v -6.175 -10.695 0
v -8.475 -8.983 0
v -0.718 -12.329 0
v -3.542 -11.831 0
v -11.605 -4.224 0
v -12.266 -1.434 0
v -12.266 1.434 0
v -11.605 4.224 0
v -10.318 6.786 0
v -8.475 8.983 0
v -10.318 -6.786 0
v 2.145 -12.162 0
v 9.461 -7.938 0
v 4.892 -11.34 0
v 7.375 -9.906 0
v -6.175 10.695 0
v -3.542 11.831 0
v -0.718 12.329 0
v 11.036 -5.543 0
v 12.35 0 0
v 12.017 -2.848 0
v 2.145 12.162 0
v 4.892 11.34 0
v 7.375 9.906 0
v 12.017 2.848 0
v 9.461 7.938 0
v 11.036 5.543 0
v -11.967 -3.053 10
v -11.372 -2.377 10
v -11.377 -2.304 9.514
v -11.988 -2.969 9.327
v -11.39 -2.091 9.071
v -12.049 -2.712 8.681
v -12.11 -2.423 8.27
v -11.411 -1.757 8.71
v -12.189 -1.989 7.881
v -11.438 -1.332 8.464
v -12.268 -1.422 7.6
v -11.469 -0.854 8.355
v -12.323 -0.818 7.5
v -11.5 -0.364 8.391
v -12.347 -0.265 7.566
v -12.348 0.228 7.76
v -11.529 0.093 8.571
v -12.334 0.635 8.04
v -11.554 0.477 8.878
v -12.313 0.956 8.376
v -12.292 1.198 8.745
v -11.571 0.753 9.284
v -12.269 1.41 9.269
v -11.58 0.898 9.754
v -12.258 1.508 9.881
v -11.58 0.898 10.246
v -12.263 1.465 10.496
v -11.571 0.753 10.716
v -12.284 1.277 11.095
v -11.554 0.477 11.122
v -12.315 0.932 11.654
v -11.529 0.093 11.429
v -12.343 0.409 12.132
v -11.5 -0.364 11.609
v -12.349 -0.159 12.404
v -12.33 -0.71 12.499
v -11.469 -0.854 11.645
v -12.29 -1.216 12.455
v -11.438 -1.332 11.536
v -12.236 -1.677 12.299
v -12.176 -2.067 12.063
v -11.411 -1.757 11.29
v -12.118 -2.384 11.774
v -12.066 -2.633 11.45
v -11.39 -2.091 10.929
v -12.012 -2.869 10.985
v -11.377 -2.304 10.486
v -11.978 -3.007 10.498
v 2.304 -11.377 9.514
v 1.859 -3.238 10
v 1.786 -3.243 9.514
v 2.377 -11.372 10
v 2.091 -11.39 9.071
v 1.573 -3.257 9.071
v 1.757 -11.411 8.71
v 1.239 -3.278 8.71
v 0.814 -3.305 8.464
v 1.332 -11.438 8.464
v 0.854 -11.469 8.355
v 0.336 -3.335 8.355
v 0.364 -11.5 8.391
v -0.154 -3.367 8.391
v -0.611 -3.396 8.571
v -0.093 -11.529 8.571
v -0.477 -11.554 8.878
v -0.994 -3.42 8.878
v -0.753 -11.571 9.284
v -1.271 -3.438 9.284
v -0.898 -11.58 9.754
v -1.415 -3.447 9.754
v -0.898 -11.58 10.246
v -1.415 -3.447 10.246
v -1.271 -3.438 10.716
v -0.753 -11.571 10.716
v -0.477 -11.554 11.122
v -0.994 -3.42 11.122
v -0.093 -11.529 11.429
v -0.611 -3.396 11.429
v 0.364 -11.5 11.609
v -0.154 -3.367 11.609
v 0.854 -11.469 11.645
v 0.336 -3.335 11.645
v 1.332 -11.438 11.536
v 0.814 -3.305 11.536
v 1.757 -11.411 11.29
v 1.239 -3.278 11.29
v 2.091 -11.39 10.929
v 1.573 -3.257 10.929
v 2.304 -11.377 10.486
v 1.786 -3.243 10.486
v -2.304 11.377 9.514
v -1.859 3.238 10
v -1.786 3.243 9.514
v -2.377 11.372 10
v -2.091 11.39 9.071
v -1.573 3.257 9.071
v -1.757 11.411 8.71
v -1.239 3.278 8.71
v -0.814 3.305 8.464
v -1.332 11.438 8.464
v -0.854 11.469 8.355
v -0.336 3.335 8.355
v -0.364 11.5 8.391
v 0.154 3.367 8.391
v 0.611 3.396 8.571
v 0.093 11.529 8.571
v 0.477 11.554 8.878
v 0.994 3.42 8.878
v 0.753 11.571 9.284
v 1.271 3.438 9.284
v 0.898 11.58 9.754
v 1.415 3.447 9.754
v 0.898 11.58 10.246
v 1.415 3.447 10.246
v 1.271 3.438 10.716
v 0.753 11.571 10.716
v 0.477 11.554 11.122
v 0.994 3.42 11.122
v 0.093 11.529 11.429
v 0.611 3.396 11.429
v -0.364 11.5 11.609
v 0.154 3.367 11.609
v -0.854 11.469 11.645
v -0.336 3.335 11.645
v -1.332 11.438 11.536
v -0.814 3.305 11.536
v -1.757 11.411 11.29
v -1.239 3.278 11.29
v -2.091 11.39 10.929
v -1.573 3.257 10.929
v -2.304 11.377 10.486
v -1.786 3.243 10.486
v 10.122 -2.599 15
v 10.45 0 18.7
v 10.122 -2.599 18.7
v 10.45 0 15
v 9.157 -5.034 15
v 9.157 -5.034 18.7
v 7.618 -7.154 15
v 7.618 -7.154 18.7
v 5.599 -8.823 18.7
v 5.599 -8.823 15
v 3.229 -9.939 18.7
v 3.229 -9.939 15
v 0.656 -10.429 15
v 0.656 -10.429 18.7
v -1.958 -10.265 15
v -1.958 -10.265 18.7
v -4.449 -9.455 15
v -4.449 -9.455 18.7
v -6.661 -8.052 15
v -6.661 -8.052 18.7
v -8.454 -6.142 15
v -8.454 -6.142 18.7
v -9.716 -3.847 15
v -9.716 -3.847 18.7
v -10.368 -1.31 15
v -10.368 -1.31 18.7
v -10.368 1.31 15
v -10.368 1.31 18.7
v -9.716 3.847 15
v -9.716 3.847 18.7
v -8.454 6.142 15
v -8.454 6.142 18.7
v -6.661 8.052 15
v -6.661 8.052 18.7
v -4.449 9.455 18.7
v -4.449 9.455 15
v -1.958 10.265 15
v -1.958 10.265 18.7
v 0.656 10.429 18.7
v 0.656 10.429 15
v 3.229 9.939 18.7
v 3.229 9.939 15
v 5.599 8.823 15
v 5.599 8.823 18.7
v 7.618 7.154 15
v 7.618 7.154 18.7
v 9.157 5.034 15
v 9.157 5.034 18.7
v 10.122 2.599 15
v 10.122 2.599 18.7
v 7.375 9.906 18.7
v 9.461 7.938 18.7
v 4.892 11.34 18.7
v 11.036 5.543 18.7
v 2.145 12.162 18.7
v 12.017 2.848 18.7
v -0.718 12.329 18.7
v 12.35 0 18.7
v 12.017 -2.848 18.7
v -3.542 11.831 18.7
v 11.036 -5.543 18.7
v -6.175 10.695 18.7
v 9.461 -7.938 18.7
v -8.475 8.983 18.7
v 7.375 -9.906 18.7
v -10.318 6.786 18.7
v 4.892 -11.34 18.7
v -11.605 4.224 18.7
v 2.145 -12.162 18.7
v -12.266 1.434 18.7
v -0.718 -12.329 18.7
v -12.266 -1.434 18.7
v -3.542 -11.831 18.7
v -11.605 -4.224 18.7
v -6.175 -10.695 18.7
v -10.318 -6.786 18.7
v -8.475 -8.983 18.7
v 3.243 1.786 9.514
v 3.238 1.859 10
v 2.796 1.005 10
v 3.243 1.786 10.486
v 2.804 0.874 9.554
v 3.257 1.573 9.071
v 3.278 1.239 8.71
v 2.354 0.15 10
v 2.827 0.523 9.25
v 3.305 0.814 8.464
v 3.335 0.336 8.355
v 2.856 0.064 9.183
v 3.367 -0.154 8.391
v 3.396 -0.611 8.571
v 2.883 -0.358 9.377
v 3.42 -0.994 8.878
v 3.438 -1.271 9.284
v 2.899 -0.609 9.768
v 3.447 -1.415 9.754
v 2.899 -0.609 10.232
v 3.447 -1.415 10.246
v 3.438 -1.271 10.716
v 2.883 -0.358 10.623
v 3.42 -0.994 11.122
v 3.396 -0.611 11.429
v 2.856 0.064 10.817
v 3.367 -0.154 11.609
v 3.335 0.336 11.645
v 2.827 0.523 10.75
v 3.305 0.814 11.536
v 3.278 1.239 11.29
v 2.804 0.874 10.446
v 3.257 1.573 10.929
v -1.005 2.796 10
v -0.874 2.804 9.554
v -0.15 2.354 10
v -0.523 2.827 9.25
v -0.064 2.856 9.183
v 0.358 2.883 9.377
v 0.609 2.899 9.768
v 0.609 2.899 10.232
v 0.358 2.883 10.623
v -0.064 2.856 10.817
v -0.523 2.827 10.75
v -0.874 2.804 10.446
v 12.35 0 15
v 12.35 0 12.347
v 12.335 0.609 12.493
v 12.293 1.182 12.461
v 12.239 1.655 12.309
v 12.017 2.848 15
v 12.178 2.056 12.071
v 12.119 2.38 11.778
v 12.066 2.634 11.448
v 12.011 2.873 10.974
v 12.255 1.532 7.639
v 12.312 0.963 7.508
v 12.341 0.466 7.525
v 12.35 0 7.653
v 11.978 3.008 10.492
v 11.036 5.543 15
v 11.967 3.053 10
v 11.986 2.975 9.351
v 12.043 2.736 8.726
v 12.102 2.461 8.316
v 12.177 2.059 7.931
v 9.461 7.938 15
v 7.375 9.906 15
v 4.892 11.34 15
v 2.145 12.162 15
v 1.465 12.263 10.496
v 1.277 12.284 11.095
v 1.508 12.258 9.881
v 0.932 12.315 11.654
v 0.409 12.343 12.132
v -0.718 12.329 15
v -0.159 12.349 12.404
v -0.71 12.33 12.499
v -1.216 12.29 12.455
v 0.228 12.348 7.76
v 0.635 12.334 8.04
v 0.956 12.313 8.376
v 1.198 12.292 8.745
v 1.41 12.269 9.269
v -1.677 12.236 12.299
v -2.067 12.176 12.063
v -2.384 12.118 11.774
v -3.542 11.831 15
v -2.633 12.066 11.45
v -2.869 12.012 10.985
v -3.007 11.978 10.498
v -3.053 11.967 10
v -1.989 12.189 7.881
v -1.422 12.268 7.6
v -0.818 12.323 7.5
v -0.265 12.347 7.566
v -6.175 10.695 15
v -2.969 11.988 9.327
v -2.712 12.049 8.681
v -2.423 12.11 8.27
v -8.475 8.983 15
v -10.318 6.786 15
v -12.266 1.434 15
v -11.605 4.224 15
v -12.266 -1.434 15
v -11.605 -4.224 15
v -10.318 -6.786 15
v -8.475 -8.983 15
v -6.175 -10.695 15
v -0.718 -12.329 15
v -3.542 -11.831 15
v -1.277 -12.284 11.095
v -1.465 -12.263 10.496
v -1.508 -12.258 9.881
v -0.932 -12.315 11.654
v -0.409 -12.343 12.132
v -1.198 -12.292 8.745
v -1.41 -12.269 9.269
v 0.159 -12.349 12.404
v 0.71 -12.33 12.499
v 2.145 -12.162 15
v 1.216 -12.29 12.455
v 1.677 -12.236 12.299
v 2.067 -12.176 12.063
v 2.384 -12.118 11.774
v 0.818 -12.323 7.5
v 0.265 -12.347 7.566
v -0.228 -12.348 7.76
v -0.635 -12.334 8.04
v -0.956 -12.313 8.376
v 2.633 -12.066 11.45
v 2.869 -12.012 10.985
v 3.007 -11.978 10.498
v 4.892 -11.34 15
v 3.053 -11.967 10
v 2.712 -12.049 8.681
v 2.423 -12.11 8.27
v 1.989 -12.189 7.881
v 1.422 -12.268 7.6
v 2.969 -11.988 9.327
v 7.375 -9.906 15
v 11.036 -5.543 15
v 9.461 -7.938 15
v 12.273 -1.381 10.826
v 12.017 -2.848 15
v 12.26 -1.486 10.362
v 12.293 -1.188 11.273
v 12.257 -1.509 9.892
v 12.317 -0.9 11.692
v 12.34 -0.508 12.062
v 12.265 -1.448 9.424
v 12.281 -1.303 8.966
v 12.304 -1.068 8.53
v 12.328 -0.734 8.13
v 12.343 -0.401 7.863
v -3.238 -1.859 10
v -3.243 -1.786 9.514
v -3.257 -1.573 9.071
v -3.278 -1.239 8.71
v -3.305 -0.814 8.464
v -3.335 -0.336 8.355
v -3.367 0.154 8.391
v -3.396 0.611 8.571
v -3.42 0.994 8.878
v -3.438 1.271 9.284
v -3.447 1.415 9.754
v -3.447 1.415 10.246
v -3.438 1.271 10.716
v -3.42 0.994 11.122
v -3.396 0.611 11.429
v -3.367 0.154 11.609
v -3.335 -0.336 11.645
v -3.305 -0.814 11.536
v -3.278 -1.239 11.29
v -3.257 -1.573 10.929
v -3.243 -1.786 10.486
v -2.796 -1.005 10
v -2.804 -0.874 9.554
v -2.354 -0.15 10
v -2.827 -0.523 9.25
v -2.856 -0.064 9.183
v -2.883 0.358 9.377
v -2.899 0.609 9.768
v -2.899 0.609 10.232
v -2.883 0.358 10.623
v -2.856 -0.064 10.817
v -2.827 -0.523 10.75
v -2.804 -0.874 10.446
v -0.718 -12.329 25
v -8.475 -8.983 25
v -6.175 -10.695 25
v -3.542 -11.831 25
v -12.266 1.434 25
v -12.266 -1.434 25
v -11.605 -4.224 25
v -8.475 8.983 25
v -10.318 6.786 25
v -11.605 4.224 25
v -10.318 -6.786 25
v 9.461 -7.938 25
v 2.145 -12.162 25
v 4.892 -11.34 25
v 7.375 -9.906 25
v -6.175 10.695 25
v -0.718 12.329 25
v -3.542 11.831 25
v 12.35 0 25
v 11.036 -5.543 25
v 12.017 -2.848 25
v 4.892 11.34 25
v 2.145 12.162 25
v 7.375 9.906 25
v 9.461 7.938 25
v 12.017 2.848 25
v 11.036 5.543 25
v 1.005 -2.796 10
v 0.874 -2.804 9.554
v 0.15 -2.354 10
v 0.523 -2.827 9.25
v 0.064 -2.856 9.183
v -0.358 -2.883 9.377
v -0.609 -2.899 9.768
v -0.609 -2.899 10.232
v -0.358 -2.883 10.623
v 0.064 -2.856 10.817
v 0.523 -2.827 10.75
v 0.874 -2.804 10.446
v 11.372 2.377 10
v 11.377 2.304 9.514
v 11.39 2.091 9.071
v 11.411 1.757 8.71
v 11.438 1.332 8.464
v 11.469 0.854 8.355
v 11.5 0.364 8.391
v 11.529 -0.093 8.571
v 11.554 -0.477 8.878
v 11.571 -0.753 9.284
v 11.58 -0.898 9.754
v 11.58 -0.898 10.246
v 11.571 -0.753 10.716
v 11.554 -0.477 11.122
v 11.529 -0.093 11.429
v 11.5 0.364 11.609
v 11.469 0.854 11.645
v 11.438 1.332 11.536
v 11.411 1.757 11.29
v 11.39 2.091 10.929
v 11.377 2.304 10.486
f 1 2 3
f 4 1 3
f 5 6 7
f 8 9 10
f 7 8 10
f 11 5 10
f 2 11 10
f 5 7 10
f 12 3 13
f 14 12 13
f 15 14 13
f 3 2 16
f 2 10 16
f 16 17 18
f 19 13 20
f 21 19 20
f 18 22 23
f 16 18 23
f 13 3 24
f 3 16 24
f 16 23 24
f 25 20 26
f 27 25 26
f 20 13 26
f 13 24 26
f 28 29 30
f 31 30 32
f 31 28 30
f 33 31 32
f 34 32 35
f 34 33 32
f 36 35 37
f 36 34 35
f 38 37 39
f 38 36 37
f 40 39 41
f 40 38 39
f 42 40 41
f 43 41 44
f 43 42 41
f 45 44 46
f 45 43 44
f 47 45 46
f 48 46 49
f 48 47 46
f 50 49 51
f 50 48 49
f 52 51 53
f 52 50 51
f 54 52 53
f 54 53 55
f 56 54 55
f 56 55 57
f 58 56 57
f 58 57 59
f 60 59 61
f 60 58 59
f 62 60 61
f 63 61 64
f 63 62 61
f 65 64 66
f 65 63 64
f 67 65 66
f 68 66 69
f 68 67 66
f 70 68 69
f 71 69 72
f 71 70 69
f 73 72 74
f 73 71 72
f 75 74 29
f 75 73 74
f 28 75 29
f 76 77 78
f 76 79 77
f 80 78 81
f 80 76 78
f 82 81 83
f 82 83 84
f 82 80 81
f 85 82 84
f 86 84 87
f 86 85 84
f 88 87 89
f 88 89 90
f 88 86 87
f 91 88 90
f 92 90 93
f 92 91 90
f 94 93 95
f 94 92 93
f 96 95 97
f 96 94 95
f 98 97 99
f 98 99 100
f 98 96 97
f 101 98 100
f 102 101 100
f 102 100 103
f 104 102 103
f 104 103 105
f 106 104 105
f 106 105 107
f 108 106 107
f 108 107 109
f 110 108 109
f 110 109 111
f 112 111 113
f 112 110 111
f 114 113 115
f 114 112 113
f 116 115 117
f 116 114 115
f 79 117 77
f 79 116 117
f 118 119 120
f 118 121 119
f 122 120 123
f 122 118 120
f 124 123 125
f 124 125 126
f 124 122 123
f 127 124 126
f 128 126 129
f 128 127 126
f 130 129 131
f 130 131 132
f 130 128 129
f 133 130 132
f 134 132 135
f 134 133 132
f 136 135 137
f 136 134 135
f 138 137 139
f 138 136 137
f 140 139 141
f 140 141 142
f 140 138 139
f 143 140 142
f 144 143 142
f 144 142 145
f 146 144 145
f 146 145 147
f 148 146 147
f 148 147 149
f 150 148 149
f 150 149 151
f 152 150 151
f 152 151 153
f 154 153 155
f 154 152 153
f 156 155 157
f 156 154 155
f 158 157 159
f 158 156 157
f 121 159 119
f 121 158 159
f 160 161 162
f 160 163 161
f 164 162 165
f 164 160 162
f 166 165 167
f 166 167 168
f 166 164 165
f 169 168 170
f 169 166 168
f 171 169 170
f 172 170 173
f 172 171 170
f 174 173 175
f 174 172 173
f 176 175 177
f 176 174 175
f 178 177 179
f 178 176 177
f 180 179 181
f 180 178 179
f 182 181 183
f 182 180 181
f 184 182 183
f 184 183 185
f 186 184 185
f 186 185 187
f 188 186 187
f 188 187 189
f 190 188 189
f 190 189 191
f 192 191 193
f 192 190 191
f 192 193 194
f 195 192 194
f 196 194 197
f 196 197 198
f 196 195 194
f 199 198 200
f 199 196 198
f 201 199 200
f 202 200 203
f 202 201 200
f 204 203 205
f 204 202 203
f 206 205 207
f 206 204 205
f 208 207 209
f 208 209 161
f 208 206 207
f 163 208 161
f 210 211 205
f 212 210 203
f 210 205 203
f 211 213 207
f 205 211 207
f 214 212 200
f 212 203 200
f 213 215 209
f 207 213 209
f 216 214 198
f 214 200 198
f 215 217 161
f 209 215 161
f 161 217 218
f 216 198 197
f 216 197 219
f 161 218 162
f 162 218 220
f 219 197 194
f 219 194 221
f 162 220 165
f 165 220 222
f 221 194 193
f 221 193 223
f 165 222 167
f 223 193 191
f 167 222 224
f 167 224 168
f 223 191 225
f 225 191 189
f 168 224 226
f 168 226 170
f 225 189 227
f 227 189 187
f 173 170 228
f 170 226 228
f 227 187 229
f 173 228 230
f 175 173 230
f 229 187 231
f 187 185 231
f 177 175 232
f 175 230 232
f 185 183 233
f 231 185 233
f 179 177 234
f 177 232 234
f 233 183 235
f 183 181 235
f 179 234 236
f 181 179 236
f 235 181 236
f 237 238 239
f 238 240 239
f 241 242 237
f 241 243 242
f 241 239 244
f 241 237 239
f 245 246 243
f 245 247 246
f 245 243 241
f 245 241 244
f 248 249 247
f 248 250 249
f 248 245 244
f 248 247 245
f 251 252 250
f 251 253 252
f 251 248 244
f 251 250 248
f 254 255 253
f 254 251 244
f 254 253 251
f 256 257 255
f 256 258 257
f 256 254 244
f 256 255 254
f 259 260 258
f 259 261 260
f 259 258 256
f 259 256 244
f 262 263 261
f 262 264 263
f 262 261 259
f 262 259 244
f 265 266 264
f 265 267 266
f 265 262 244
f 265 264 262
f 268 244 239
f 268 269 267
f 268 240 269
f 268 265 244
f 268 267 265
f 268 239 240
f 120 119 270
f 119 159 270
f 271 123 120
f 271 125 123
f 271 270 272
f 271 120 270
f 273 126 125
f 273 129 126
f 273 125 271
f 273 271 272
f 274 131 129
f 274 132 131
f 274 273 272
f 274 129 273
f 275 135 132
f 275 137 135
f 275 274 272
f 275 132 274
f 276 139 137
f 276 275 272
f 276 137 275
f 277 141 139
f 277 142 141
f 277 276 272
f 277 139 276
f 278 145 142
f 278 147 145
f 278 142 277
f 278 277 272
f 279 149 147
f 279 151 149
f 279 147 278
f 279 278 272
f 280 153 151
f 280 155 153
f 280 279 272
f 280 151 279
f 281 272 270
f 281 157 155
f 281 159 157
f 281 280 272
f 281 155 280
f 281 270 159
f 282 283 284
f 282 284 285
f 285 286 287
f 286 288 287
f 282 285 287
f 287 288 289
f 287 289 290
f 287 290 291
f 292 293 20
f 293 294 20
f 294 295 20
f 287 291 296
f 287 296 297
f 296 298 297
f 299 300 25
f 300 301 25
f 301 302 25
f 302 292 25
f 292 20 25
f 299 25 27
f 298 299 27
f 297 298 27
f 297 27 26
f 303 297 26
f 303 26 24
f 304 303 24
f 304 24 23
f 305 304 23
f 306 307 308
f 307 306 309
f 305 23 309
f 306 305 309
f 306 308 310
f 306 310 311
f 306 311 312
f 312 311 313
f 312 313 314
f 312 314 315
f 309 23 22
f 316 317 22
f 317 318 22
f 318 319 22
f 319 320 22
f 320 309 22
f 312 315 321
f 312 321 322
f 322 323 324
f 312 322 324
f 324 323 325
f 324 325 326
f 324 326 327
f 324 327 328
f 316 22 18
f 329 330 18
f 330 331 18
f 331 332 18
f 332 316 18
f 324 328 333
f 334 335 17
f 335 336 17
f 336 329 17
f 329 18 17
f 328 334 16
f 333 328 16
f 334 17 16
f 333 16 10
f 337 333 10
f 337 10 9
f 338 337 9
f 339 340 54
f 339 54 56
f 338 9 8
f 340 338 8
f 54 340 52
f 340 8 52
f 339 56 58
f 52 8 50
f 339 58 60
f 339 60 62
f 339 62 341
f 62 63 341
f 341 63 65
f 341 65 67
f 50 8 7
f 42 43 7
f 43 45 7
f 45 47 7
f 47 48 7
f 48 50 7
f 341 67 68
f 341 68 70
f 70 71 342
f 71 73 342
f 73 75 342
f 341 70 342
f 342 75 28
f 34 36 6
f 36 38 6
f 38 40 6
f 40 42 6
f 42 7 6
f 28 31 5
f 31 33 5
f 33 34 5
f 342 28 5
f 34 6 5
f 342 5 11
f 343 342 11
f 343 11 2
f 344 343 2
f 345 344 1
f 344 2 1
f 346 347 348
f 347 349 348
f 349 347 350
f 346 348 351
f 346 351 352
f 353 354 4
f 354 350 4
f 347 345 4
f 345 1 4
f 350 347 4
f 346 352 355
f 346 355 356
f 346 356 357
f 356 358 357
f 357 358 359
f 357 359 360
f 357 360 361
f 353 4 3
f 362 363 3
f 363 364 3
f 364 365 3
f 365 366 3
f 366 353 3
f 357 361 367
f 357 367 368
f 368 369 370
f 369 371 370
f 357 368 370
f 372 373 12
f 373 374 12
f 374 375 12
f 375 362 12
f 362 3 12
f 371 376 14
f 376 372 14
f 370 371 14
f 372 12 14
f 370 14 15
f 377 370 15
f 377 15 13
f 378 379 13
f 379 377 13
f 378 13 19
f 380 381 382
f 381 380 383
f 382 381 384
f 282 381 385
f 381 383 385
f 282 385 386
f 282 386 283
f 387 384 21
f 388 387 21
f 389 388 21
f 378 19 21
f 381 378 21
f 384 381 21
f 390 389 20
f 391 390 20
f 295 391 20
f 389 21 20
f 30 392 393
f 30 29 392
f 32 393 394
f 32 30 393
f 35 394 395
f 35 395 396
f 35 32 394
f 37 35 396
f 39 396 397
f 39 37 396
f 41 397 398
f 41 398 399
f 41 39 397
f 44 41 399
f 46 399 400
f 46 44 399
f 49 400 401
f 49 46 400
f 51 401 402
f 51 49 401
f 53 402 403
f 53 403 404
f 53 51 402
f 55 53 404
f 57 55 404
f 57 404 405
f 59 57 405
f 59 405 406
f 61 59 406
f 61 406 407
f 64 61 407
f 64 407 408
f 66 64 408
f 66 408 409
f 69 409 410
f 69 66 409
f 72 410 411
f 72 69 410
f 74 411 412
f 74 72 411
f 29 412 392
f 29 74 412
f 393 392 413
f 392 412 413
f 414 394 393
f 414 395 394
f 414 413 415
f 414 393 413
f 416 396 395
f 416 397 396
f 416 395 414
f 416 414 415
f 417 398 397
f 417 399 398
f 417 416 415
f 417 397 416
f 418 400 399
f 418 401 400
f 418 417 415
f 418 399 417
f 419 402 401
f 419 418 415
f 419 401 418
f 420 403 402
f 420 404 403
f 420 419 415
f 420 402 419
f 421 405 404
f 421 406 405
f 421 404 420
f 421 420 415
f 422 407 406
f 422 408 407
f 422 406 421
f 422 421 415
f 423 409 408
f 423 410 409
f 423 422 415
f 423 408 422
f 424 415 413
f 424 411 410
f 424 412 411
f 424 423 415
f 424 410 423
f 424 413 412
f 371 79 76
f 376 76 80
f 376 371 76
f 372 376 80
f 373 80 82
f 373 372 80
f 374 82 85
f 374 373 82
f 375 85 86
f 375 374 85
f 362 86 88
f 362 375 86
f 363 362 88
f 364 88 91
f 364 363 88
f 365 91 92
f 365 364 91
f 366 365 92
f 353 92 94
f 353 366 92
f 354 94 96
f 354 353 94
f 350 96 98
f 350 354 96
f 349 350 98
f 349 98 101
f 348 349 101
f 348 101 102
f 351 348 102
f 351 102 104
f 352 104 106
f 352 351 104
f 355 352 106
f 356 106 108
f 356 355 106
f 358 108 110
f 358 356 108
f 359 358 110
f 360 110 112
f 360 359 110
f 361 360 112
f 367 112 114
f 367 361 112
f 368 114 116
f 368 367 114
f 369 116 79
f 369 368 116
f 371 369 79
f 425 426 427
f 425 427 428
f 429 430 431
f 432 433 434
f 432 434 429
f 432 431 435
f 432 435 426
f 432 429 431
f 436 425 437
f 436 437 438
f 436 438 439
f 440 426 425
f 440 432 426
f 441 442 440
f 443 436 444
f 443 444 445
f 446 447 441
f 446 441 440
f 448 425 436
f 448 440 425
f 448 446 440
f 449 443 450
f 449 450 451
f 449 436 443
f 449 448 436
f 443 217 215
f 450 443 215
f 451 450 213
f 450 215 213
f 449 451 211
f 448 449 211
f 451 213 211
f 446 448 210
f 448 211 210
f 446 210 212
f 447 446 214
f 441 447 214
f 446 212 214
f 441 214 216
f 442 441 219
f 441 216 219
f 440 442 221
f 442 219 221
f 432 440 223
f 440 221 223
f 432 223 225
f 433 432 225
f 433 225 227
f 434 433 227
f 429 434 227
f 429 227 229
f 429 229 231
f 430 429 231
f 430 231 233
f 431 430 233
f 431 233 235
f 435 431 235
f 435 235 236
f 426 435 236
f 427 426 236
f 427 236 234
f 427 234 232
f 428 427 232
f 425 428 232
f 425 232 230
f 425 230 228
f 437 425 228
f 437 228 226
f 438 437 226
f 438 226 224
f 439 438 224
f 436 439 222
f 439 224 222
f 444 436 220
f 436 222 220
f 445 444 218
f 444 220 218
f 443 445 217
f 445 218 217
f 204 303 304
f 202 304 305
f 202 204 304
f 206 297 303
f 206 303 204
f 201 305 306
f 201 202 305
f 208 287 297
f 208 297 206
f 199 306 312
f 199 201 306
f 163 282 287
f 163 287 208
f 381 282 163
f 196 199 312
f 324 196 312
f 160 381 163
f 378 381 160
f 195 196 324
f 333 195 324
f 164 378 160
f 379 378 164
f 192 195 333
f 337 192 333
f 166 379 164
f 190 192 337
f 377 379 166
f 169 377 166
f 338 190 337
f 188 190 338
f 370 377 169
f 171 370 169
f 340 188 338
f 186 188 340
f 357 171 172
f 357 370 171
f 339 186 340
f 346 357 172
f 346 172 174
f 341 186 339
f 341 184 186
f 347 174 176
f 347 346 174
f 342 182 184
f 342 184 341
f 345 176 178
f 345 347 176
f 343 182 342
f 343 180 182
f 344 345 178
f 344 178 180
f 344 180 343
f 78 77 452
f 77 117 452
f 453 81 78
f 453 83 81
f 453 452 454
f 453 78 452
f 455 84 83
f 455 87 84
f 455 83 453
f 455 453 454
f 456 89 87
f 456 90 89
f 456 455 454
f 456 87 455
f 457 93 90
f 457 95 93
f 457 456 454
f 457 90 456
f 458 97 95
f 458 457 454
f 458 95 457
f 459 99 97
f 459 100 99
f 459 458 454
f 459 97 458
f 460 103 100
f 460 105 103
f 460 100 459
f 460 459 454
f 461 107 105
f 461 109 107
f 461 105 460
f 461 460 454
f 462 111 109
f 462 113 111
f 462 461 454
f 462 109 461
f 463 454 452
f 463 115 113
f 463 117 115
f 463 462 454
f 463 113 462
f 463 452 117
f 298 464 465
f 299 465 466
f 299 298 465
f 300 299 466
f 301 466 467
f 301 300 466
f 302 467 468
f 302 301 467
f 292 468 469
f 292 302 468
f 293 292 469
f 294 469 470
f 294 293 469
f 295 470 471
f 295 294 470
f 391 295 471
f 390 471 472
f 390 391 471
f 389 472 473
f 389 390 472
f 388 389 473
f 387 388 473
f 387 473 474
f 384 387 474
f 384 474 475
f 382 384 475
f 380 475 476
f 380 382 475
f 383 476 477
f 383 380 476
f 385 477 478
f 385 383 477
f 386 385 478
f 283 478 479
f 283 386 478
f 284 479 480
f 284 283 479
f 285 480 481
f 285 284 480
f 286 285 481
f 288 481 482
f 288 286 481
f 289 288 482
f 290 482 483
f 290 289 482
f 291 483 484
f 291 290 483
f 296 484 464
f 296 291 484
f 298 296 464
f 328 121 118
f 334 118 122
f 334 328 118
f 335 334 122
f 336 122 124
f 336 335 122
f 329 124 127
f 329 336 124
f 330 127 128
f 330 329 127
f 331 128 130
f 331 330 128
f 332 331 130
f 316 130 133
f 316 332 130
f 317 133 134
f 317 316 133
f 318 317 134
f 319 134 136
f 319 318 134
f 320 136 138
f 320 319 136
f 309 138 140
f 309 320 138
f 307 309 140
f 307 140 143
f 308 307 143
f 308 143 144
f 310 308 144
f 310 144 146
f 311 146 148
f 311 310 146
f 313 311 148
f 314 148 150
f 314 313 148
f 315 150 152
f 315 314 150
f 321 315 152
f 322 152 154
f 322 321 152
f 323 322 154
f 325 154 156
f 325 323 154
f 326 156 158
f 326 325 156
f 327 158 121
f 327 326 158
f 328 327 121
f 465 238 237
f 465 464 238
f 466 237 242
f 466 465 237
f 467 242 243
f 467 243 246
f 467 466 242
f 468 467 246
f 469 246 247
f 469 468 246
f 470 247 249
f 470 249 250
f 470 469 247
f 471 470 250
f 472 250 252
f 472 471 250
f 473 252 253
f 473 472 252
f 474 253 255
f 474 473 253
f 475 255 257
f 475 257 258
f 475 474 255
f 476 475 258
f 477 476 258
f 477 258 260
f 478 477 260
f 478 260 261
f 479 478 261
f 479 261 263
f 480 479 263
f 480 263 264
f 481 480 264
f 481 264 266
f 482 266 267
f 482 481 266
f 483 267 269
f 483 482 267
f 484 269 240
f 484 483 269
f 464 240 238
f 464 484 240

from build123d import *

# Parameters (mm, degrees)
SKETCH1_R           = 12.35
BOSS_EXTRUDE1_DEPTH = 25
CIRPATTERN1_COUNT   = 4
SKETCH7_W           = 3.7
SKETCH7_H           = 1.9


with BuildPart() as part:
    # Sketch1 → Boss-Extrude1 (new body)
    with BuildSketch(Plane.XY):
        Circle(SKETCH1_R)
    extrude(amount=BOSS_EXTRUDE1_DEPTH)

    # Sketch2 → M4x0.7 Tapped Hole1 (revolve, cut)
    with BuildSketch(Plane(origin=(-0.784484958, 12.325059162, 10), x_dir=(-0.9979804989599389, -0.06352104923308127, 0), z_dir=(0, 0, 1))):
        Polygon((0, 0), (0, 9.991420021), (1.65, 9), (1.65, 0.85), (2.5, 0), align=None)
    m4x0_7_tapped_hole1 = revolve(axis=Axis((-1.187843621, 18.662235331, 10), (0.06352104923308129, -0.9979804989599389, 0)), mode=Mode.SUBTRACT)

    # CirPattern1: M4x0.7 Tapped Hole1 ×4 about axis
    cirpattern1_axis = Axis((0, 0, 25), (0, 0, -1))
    for i in range(1, CIRPATTERN1_COUNT):
        add(m4x0_7_tapped_hole1.rotate(cirpattern1_axis, i * 360 / CIRPATTERN1_COUNT), mode=Mode.SUBTRACT)

    # Sketch7 → Cut-Revolve1 (revolve, cut)
    with BuildSketch(Plane(origin=(0, 0, 0), x_dir=(0, 0, -1), z_dir=(1, 0, 0)), mode=Mode.PRIVATE) as cut_revolve1_sk:
        with Locations((-16.85, 11.4)):
            Rectangle(SKETCH7_W, SKETCH7_H)
    revolve(cut_revolve1_sk.sketch.rotate(Axis((0, 0, 25), (0, 0, -1)), 90), axis=Axis((0, 0, 25), (0, 0, -1)), mode=Mode.SUBTRACT)


solid = part.part
